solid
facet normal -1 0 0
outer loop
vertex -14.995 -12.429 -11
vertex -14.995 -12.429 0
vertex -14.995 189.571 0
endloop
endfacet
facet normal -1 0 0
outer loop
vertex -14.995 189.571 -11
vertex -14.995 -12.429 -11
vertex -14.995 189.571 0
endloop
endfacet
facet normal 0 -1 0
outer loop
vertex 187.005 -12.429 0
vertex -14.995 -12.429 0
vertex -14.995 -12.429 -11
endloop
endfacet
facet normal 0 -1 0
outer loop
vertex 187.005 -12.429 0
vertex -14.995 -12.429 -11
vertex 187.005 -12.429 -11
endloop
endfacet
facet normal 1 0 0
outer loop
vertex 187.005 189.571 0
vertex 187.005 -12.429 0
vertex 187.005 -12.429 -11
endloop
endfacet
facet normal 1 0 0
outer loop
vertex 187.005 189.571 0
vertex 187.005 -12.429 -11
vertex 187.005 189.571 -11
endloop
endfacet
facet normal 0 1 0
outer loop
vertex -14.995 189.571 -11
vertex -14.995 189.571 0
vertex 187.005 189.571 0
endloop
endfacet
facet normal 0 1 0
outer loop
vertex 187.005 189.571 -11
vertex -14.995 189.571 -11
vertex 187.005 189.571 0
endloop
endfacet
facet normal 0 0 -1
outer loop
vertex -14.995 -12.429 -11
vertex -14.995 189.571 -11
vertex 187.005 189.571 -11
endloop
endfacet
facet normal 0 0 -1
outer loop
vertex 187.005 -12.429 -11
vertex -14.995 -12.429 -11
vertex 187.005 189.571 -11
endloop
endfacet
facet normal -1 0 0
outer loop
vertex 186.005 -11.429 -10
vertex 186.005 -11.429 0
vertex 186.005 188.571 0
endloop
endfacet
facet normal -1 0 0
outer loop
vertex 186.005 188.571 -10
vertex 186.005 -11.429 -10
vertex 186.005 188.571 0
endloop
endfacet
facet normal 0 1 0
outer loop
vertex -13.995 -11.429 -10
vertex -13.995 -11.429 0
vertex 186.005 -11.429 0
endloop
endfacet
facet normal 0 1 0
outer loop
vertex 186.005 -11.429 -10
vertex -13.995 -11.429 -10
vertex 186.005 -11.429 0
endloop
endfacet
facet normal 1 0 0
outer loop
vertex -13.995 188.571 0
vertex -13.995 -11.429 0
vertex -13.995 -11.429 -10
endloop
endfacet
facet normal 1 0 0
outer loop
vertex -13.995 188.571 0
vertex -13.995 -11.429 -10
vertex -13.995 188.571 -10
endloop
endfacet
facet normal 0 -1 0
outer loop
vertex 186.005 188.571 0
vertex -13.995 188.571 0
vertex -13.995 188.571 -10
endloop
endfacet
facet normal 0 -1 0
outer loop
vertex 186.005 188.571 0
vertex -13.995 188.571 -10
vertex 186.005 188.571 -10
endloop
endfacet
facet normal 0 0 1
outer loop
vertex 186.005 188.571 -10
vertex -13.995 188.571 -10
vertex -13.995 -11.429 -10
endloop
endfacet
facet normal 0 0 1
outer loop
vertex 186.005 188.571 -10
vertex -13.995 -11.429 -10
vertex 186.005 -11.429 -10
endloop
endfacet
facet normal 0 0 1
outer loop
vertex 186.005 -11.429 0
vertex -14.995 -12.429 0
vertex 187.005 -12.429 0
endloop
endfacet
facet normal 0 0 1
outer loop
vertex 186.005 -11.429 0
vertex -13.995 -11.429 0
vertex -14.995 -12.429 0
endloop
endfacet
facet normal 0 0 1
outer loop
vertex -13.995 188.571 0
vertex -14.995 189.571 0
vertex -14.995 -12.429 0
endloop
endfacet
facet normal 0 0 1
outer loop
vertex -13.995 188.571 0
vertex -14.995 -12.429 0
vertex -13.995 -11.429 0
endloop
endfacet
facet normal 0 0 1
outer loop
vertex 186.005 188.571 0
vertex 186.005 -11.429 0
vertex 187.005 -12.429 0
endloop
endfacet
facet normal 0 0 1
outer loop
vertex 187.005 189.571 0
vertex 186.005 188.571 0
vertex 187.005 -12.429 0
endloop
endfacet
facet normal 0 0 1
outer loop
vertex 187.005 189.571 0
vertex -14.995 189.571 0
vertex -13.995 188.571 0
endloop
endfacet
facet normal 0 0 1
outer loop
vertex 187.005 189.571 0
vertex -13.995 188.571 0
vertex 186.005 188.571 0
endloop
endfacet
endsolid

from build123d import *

# Parameters (mm, degrees)
SKETCH_2_W      = 202
SKETCH_2_H      = 202
EXTRUDE_1_DEPTH = 11
SKETCH_1_W      = 200
SKETCH_1_H      = 200
EXTRUDE_2_DEPTH = 10


with BuildPart() as part:
    # 草图2 → 凸台-拉伸1 (new body)
    with BuildSketch(Plane.XY):
        with Locations((86.004694039, 88.571428571)):
            Rectangle(SKETCH_2_W, SKETCH_2_H)
    extrude(amount=-EXTRUDE_1_DEPTH)


with BuildPart() as body_2:
    # 草图1 → 凸台-拉伸2 (new body)
    with BuildSketch(Plane.XY):
        with Locations((86.004694039, 88.571428571)):
            Rectangle(SKETCH_1_W, SKETCH_1_H)
    extrude(amount=-EXTRUDE_2_DEPTH)


with BuildPart() as part_1:
    add(part.part)

    # Combine 1: cut body 2
    add(body_2.part, mode=Mode.SUBTRACT)


solid = part_1.part
